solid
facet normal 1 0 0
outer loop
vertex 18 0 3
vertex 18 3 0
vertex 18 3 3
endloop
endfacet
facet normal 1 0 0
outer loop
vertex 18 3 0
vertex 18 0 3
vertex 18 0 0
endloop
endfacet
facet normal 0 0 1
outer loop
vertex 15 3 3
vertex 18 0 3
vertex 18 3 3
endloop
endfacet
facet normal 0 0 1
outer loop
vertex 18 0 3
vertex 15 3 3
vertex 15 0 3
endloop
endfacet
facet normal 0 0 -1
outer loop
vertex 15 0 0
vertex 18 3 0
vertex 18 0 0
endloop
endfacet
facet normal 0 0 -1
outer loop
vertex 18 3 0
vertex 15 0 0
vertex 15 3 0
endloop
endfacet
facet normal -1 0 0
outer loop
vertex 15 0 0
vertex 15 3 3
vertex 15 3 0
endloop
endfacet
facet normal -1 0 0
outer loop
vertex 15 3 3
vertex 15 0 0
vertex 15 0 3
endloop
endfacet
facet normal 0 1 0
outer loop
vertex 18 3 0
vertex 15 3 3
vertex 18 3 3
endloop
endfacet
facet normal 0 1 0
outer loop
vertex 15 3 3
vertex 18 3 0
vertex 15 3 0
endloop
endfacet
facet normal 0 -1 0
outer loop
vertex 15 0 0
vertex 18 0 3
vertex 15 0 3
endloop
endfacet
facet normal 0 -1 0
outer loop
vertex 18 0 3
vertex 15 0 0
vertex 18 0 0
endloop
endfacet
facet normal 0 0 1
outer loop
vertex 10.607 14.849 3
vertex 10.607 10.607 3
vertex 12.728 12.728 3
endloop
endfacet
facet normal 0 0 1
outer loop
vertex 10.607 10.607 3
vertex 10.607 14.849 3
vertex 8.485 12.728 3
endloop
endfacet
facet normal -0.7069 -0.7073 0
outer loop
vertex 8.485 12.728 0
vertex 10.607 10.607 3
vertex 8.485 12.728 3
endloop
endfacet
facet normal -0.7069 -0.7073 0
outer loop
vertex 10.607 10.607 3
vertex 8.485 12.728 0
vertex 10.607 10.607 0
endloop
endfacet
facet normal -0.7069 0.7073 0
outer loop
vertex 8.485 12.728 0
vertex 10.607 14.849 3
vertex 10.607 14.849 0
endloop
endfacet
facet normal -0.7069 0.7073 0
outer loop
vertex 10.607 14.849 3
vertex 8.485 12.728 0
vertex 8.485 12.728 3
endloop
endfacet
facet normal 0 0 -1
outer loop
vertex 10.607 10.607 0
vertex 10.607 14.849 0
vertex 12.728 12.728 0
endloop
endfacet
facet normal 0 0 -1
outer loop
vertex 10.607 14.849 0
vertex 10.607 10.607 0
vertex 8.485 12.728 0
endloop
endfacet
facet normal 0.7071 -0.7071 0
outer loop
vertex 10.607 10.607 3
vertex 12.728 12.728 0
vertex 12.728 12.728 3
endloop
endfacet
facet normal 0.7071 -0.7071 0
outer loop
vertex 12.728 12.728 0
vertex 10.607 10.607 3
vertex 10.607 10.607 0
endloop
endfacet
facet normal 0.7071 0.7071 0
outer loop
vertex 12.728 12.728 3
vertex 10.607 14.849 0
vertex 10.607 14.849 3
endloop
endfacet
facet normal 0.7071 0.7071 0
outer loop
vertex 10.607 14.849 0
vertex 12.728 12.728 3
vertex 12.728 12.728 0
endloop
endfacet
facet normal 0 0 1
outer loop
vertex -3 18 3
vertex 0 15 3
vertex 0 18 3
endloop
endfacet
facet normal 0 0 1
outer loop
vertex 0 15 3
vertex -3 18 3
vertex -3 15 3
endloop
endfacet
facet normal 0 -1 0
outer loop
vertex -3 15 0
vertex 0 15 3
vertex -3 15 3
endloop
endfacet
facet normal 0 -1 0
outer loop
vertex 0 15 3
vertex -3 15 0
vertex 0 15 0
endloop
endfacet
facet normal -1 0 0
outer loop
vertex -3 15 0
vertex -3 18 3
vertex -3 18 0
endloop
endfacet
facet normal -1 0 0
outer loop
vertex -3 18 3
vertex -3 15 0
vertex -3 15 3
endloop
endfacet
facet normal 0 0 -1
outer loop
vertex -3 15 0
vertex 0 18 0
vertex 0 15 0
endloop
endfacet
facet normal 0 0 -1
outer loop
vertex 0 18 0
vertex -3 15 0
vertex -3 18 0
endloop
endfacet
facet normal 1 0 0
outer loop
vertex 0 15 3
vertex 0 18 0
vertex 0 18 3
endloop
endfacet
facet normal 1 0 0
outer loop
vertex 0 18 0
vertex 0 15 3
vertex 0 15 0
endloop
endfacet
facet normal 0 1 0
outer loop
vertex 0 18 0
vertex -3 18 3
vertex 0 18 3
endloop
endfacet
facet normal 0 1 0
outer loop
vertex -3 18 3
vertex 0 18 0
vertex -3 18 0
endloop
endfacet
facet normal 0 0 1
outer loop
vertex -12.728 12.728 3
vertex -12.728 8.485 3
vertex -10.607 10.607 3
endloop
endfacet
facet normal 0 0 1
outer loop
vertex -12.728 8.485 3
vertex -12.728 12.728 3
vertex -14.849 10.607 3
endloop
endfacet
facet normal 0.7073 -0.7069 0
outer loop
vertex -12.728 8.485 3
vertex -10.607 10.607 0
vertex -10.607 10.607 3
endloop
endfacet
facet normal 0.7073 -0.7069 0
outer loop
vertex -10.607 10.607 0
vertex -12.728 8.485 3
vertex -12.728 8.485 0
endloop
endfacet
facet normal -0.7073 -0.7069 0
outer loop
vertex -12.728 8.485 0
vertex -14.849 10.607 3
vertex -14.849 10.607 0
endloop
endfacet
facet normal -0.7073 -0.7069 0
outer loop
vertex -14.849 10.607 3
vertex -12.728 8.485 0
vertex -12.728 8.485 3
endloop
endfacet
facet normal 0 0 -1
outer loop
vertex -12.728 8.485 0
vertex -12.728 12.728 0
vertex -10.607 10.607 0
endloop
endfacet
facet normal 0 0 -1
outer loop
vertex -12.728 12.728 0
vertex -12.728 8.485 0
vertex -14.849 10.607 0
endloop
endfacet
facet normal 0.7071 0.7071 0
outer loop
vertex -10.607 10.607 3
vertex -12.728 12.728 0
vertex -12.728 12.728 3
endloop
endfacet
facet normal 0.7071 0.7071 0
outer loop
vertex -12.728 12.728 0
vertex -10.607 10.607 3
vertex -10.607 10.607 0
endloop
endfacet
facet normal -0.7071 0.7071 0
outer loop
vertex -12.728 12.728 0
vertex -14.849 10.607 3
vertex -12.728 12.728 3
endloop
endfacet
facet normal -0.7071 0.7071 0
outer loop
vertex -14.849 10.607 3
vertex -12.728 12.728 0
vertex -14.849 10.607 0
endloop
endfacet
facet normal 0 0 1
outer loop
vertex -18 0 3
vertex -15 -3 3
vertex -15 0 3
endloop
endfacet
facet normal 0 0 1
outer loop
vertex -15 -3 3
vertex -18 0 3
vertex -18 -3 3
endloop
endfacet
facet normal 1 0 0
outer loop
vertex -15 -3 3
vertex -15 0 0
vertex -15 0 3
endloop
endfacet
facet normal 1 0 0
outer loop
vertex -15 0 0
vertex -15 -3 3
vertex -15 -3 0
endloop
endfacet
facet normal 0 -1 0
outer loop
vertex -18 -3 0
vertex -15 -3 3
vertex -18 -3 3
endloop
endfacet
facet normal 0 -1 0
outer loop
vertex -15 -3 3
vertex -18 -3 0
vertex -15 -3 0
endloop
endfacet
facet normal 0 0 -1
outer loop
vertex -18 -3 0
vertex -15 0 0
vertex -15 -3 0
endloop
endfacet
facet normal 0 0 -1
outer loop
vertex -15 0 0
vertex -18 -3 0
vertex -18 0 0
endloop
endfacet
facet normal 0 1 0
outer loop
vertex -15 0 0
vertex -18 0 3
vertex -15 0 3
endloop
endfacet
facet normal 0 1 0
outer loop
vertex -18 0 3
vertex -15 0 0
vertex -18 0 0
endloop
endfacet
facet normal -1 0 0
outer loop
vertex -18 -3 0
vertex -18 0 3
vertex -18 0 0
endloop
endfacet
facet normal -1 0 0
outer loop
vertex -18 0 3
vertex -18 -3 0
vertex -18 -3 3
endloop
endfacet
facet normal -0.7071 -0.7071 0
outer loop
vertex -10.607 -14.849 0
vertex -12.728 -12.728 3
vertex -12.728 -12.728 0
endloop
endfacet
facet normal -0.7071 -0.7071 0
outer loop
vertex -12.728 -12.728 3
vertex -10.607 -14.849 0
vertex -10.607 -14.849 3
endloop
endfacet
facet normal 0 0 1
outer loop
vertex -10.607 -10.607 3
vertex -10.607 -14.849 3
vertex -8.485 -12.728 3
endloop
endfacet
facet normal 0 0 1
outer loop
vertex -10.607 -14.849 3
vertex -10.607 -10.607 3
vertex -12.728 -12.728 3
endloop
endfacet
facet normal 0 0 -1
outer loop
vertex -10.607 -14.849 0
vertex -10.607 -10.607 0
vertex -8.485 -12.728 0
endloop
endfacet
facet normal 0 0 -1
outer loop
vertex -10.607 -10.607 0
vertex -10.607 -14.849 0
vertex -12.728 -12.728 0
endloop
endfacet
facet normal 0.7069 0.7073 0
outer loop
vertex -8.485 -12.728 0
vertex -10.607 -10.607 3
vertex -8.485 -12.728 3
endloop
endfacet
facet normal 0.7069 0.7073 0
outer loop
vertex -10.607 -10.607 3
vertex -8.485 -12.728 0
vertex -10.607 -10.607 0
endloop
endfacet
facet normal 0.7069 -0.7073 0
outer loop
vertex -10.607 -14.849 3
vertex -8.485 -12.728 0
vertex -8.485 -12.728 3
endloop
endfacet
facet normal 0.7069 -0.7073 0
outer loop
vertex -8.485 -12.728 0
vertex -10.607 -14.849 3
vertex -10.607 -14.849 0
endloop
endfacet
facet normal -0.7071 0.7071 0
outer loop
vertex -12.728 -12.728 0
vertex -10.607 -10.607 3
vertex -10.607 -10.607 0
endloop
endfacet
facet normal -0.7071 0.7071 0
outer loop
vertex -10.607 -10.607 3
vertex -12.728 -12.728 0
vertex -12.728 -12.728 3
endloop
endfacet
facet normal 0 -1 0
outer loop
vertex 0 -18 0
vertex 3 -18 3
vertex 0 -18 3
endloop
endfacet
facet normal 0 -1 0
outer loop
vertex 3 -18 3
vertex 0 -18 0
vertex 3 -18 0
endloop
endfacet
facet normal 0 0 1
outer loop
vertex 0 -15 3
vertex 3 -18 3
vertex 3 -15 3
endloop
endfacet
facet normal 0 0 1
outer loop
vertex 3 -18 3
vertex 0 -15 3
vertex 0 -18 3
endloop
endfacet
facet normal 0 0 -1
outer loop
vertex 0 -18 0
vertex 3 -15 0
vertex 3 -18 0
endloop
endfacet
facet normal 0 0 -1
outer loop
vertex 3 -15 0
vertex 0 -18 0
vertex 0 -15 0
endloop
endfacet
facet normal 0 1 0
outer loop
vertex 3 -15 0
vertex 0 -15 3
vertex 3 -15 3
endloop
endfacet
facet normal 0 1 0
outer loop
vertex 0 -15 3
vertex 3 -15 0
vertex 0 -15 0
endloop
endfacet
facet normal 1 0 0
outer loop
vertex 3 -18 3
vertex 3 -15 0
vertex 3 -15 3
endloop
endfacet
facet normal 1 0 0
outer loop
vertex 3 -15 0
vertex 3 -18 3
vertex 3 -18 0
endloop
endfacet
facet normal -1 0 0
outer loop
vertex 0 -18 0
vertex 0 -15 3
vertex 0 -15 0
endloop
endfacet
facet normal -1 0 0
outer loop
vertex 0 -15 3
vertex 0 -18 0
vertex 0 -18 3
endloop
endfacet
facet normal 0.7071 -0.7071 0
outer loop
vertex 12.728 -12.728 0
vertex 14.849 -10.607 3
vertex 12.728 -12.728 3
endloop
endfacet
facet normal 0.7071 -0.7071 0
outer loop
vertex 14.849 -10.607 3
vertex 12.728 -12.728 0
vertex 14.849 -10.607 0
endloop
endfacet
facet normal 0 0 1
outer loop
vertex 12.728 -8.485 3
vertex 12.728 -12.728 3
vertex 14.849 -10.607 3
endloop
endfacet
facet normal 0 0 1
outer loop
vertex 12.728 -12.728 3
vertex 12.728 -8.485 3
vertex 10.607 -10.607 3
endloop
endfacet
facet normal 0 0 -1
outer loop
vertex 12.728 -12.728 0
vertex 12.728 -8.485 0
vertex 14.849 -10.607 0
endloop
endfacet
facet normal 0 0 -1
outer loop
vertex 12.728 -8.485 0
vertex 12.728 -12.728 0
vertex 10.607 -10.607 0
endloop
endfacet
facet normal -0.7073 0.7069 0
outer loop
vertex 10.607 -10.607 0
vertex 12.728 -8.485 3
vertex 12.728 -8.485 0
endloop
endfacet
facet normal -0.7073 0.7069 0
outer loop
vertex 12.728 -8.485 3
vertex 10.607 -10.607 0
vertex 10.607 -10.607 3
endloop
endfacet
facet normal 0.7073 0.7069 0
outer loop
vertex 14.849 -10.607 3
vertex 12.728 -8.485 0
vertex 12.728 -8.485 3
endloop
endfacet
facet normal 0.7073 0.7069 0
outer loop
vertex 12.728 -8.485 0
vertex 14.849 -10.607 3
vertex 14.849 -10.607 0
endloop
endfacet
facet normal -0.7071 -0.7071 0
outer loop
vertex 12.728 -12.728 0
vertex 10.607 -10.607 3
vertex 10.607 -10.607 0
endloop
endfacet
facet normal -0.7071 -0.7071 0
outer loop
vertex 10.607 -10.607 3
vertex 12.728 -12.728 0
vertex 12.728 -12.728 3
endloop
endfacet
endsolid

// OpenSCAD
// BOSL-style zring() - distribute children around Z axis
module zring(n = 6, r = 10) {
    for (i = [0 : n - 1]) {
        rotate([0, 0, i * 360 / n])
            translate([r, 0, 0])
                children();
    }
}

zring(n = 8, r = 15) cube(3);
